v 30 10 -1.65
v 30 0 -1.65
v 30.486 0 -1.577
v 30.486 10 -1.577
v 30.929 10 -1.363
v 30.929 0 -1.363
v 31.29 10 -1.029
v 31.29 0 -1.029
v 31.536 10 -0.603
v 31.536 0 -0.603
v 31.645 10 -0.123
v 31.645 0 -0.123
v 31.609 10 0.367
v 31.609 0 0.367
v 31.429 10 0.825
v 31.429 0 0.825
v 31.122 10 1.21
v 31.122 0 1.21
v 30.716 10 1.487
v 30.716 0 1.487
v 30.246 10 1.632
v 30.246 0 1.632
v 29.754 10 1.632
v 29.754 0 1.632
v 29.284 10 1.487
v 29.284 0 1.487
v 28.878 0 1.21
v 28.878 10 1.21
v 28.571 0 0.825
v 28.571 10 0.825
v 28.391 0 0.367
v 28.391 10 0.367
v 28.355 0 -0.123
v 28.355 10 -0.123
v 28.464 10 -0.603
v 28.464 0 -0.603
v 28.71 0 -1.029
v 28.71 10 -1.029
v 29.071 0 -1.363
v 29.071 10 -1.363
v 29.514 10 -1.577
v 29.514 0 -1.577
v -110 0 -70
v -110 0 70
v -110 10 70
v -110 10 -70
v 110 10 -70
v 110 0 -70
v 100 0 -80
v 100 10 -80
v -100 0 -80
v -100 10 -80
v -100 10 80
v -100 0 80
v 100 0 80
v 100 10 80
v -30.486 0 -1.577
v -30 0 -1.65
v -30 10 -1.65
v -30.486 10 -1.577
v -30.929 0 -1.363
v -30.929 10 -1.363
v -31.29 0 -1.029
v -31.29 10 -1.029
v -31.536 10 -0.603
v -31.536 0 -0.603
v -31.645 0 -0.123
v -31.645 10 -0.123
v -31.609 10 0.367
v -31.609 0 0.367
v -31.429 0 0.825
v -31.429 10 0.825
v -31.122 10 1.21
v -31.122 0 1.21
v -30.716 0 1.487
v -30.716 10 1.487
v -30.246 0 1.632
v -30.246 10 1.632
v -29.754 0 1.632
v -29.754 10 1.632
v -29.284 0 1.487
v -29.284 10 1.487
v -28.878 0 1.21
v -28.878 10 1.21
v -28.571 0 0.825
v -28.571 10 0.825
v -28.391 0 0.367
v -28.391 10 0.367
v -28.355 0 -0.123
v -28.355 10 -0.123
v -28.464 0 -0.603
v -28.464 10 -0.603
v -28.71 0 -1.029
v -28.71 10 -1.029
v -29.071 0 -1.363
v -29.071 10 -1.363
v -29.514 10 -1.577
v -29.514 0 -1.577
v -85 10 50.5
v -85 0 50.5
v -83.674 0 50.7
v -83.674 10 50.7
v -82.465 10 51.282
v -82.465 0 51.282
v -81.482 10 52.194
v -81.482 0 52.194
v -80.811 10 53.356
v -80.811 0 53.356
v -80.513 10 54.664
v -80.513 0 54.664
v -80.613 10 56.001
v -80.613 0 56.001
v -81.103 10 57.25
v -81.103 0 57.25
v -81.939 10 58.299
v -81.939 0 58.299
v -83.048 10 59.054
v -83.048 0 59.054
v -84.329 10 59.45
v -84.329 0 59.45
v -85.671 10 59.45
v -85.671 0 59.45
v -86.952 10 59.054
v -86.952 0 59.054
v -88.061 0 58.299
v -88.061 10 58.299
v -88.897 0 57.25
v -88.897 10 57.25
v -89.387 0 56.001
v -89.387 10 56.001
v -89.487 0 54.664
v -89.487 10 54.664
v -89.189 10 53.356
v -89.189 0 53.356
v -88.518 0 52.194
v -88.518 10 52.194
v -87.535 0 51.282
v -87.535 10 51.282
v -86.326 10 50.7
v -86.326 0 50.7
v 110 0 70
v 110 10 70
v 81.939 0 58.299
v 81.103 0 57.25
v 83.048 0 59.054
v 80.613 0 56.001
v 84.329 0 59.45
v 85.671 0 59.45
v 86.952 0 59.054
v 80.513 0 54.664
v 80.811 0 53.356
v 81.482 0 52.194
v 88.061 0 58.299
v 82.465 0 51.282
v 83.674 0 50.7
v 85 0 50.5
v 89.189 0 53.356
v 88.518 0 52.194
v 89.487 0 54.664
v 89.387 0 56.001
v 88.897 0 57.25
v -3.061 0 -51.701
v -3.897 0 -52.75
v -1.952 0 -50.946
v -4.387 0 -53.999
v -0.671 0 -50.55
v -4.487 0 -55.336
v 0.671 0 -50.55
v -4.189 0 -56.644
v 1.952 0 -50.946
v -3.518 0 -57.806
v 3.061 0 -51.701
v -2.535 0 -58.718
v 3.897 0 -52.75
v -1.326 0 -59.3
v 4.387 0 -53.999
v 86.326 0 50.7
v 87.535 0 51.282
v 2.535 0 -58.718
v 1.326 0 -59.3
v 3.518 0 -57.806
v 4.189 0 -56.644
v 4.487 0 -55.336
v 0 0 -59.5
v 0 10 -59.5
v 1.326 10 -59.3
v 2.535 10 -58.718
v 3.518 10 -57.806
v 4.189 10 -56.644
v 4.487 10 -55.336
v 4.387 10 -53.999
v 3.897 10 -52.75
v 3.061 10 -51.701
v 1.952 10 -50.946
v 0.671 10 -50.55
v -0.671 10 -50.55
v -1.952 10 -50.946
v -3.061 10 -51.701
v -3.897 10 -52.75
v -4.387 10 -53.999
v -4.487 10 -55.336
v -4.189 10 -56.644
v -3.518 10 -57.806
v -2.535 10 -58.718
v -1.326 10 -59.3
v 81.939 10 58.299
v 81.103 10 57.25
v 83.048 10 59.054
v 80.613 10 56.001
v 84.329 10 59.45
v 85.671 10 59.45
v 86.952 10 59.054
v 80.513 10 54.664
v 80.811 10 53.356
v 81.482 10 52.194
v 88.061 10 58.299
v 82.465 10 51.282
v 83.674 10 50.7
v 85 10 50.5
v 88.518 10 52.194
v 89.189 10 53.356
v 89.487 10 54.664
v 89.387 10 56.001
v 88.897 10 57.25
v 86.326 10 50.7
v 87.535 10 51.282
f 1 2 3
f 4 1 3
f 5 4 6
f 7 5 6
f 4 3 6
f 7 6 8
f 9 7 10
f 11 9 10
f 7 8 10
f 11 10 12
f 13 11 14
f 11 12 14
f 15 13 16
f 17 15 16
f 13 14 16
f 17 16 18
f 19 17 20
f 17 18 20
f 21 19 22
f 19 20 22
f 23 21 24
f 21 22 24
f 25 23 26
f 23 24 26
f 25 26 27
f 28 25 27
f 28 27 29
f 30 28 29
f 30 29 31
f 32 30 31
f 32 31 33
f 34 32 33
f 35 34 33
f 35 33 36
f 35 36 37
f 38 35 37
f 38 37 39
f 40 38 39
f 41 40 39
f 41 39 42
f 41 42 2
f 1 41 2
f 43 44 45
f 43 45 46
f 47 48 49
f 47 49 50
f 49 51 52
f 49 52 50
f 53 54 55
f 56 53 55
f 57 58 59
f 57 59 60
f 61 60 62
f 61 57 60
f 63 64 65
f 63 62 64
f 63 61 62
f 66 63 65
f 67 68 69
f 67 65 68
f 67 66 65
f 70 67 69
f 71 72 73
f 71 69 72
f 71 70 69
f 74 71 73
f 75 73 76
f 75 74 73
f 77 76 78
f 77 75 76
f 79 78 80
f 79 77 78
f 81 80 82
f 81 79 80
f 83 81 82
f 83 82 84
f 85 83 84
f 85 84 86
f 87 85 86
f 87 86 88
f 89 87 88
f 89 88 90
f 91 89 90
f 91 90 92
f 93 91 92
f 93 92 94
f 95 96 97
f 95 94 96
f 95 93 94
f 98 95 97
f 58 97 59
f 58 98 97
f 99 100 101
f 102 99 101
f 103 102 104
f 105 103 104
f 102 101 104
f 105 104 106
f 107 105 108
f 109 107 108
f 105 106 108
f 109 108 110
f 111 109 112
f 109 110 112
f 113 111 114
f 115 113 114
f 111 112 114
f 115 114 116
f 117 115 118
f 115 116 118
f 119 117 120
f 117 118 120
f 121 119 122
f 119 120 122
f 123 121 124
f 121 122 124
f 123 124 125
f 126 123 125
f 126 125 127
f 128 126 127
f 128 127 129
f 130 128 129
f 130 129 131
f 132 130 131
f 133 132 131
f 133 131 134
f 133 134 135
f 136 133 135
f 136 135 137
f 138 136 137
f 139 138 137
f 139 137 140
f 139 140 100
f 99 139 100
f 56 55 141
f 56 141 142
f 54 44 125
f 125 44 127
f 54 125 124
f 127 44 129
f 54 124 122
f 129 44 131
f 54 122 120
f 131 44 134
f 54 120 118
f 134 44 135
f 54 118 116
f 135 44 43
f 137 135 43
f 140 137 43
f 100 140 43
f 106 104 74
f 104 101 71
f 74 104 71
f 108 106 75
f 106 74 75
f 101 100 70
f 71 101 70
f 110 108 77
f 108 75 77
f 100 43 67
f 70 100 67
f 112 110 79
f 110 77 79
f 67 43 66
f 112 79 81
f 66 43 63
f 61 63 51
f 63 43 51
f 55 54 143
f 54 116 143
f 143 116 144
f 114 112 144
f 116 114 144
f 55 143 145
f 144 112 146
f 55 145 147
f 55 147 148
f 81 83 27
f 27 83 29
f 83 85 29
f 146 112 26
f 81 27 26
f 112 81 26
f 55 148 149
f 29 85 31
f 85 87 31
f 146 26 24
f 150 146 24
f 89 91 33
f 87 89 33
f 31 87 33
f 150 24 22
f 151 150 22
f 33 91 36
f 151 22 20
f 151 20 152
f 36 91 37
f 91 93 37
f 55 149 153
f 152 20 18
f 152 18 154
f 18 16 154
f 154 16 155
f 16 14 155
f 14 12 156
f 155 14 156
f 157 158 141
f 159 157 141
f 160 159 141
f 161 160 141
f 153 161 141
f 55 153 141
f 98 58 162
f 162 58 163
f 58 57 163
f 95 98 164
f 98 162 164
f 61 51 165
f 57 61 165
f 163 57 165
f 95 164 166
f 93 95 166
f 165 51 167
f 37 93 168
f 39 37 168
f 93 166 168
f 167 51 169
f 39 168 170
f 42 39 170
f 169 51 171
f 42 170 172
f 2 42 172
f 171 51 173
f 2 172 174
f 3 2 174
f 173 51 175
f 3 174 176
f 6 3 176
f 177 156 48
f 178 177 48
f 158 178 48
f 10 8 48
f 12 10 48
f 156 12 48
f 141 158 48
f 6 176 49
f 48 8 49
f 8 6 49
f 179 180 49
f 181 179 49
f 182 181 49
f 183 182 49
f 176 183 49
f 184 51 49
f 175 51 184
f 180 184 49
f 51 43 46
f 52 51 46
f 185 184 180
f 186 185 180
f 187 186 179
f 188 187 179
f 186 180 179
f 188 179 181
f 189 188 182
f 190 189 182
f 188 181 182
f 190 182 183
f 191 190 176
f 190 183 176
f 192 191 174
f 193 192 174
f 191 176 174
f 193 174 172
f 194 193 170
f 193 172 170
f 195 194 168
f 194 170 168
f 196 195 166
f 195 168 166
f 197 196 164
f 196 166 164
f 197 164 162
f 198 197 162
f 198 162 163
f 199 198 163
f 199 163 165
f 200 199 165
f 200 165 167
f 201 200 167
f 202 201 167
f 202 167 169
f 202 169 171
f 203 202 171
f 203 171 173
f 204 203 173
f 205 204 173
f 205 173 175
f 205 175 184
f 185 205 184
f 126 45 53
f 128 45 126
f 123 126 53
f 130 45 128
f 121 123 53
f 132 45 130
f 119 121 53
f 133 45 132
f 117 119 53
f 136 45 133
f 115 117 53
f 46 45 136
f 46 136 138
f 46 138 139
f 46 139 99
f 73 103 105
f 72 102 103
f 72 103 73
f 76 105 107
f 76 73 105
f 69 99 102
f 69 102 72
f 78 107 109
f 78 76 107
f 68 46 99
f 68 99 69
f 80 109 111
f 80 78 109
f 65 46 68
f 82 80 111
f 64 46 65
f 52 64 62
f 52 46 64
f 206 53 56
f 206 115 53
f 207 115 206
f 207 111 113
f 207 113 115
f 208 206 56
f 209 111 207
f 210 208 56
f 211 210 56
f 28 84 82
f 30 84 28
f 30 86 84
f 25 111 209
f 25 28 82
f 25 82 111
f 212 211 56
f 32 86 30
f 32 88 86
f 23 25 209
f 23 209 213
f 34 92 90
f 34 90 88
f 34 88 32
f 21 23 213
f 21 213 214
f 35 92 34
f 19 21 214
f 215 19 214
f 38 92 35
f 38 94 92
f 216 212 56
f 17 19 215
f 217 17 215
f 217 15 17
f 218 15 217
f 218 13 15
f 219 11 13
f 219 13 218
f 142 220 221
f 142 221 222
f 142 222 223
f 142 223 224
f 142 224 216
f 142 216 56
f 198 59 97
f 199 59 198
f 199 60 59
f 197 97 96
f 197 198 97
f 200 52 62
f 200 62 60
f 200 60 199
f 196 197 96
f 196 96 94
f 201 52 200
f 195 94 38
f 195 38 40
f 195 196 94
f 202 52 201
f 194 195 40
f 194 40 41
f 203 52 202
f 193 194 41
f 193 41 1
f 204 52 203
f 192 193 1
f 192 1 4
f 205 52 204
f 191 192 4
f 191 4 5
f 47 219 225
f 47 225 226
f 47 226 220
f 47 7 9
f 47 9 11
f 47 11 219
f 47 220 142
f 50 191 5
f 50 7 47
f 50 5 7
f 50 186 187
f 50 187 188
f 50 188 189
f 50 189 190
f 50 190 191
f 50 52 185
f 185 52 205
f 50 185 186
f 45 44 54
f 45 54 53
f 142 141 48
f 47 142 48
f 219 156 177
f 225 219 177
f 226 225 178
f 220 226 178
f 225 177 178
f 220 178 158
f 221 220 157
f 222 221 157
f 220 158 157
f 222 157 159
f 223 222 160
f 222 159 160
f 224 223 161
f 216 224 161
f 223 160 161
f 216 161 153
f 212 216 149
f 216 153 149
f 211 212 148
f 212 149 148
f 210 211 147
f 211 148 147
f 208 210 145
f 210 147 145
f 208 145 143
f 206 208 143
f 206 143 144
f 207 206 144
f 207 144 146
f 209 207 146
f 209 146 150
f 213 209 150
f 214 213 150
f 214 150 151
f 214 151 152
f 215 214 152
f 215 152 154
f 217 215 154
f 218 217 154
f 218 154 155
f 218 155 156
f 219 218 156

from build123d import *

# Parameters (mm, degrees)
SKETCH1_W              = 220
SKETCH1_H              = 160
BOSS_EXTRUDE1_DEPTH    = 10
CHAMFER1_SIZE          = 10
M10X1_0_TAPPED_HOLE1_D = 9
M4X0_7_TAPPED_HOLE1_D  = 3.3


with BuildPart() as part:
    # Sketch1 → Boss-Extrude1 (new body)
    with BuildSketch(Plane(origin=(0, 0, 0), x_dir=(1, 0, 0), z_dir=(0, 1, 0))):
        Rectangle(SKETCH1_W, SKETCH1_H)
    extrude(amount=BOSS_EXTRUDE1_DEPTH)

    # Chamfer1
    chamfer1_edges = [part.edges().sort_by_distance(p)[0] for p in [
        (-110, 5, -80),
        (110, 5, -80),
        (110, 5, 80),
        (-110, 5, 80),
    ]]
    chamfer(chamfer1_edges, length=CHAMFER1_SIZE)

    # M10x1.0 Tapped Hole1 (through all)
    with Locations(Plane(origin=(0, 10, -55), x_dir=(0, 0, 1), z_dir=(0, 1, 0))):
        with Locations((0, 0), (110, -85), (110, 85)):
            Hole(M10X1_0_TAPPED_HOLE1_D / 2)

    # M4x0.7 Tapped Hole1 (through all)
    with Locations(Plane(origin=(30, 10, 0), x_dir=(0, 0, 1), z_dir=(0, 1, 0))):
        with Locations((0, 0)):
            m4x0_7_tapped_hole1 = Hole(M4X0_7_TAPPED_HOLE1_D / 2)

    # Mirror1: M4x0.7 Tapped Hole1 across plane
    add(m4x0_7_tapped_hole1.mirror(Plane(origin=(0, 0, 0), x_dir=(0, 0, 1), z_dir=(1, 0, 0))), mode=Mode.SUBTRACT)


solid = part.part
